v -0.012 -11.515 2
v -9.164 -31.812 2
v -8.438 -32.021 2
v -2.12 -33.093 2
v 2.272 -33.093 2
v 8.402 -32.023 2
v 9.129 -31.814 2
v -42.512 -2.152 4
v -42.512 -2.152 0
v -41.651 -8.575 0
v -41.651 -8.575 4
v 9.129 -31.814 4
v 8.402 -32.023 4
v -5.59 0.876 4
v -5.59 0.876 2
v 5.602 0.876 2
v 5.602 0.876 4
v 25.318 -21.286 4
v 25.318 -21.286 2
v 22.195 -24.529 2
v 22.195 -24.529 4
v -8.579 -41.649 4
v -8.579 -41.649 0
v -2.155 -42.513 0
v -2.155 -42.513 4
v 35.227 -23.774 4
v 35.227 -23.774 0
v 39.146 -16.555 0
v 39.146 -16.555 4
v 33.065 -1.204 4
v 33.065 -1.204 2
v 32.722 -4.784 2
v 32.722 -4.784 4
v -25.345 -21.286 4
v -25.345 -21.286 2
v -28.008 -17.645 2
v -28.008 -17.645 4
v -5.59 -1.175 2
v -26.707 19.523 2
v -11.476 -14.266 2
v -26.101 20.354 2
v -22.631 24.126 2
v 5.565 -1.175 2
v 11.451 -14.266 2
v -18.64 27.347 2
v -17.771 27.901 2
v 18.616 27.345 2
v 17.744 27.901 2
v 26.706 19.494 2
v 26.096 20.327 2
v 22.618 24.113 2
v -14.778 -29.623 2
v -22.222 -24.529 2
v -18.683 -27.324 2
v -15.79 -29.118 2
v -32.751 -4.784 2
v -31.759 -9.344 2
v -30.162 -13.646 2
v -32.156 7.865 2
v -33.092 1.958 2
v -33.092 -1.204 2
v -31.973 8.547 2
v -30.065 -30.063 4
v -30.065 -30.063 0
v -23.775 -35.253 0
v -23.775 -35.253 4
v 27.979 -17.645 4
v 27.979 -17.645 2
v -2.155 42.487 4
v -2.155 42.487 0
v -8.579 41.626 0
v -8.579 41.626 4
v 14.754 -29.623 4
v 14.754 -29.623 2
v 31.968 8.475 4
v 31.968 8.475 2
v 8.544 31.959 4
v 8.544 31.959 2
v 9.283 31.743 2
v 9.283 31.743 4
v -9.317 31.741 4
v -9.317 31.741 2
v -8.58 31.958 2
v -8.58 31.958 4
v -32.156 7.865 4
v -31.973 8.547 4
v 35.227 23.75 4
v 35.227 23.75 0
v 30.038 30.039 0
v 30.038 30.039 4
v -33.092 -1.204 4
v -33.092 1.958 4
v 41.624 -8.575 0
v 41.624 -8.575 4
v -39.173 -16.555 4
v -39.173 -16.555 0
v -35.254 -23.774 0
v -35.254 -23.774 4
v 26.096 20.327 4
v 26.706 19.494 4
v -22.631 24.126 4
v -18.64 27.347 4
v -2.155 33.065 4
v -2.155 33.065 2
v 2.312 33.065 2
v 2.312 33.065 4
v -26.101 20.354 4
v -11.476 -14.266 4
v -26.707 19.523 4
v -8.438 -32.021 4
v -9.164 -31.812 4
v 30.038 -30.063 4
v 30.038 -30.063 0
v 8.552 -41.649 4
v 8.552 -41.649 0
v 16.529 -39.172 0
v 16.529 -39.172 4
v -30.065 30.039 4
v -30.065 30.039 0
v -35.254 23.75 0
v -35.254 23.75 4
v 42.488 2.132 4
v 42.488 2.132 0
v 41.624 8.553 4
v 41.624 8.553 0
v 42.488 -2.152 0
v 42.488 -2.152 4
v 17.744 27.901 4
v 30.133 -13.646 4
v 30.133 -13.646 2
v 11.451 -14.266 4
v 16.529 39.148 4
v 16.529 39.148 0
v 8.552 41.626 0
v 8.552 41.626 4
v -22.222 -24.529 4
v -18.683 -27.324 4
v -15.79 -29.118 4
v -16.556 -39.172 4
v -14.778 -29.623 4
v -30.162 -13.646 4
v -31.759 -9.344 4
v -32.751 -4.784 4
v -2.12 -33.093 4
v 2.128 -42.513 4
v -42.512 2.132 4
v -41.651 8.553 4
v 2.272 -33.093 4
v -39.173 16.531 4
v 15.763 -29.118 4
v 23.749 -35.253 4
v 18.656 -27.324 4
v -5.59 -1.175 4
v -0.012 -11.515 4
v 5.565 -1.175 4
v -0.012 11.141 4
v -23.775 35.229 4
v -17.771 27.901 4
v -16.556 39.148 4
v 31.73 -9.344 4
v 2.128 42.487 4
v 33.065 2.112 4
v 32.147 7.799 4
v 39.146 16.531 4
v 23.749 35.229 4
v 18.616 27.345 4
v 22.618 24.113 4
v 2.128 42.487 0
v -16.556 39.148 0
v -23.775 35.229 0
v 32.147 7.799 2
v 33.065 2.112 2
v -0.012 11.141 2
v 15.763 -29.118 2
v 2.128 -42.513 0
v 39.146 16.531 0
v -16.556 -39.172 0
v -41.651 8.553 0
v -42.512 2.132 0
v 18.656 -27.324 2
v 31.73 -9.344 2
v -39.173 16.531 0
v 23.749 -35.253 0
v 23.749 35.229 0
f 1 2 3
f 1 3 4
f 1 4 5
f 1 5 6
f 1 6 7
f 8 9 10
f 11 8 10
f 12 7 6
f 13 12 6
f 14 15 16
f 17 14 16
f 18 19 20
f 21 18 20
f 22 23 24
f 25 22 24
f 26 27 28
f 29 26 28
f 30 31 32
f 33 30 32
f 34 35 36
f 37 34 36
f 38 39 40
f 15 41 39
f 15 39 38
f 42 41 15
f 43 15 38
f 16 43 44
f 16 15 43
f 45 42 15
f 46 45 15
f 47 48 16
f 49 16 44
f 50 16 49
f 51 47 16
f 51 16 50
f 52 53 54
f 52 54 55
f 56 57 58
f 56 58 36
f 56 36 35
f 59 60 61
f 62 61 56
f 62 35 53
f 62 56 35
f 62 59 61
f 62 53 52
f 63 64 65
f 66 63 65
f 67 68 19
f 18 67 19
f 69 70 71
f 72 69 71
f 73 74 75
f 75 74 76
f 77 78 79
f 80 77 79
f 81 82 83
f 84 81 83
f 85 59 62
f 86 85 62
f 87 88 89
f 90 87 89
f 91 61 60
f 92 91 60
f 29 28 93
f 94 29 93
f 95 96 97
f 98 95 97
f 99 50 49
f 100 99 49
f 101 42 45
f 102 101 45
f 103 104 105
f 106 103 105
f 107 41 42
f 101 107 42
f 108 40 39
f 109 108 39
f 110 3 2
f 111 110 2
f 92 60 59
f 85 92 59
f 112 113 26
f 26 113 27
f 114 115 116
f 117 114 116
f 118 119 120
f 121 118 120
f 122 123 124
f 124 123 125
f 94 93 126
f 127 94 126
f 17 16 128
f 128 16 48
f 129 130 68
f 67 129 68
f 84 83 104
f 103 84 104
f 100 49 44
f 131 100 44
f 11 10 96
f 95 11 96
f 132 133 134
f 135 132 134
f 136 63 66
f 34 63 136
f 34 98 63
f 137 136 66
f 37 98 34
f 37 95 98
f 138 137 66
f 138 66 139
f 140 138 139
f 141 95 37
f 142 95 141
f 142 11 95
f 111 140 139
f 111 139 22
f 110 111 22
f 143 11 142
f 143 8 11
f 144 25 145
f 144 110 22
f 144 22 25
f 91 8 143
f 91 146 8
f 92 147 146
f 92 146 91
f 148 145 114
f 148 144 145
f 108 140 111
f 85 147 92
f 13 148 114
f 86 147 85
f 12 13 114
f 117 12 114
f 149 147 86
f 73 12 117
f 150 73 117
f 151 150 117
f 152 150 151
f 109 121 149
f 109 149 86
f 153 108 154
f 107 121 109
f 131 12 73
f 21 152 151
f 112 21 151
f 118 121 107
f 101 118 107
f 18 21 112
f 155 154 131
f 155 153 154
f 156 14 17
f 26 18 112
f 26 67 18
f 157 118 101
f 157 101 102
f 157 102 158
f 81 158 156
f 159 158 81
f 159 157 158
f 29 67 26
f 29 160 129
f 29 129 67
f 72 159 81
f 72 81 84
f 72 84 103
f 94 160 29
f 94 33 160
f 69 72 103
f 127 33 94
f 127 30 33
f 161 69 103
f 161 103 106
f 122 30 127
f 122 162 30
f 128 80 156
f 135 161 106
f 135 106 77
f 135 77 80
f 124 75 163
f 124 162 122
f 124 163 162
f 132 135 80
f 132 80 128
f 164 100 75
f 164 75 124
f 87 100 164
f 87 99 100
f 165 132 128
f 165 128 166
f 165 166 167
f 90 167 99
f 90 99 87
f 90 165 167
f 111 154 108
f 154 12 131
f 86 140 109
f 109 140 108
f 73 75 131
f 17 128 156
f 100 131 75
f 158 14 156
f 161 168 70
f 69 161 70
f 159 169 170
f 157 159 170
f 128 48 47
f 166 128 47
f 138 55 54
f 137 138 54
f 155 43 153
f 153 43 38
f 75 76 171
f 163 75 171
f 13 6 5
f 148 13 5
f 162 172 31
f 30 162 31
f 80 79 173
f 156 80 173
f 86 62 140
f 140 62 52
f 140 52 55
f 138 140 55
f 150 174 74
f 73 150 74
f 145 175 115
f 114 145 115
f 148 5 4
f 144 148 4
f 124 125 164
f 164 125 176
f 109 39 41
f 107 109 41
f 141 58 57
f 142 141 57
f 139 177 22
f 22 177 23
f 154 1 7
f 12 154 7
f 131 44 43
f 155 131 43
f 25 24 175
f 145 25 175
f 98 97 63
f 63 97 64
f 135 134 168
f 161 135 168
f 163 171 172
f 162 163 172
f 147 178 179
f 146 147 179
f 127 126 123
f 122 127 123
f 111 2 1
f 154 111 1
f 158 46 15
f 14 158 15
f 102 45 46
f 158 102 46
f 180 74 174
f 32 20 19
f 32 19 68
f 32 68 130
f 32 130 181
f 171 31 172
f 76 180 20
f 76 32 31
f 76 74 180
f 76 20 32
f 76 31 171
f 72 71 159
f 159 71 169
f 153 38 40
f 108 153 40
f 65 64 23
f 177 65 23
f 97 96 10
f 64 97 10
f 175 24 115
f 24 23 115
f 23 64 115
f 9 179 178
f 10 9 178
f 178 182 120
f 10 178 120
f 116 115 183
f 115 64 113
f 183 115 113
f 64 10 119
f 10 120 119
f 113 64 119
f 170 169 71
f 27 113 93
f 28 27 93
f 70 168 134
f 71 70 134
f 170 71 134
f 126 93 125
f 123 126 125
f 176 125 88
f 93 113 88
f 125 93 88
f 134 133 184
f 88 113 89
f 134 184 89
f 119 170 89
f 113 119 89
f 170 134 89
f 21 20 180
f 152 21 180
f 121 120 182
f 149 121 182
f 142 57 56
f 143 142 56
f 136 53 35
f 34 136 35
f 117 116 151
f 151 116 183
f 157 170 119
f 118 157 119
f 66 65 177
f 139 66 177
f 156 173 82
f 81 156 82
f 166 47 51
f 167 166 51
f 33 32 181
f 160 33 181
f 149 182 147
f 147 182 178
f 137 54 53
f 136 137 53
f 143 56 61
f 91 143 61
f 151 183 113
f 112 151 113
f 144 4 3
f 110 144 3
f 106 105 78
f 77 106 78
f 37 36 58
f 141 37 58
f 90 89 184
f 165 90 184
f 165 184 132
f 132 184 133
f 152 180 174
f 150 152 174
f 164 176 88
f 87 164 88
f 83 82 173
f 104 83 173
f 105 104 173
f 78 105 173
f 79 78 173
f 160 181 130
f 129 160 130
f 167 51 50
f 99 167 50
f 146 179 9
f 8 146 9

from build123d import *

# Parameters (mm, degrees)
F1_DEPTH = 4
F2_DEPTH = 2


with BuildPart() as f1:
    # F0 (on Top) → F1 (new body)
    with BuildSketch(Plane.XY):
        Polygon((-2.15507, -42.513097), (-0.012324, -42.513097), (2.128266, -42.513097), (8.551832, -41.649458), (16.529186, -39.171592), (23.748692, -35.252986), (30.037865, -30.063322), (35.227457, -23.774077), (39.146422, -16.554931), (41.624073, -8.575349), (42.487568, -2.151782), (42.487568, -0.011192), (42.487568, 2.131554), (41.624073, 8.553324), (39.146422, 16.530678), (35.227457, 23.749824), (30.037865, 30.039356), (23.748692, 35.228948), (16.529186, 39.147554), (8.551832, 41.625565), (2.128266, 42.486903), (-0.012324, 42.486903), (-2.15507, 42.486903), (-8.578637, 41.625565), (-16.556206, 39.147554), (-23.775352, 35.228948), (-30.064598, 30.039356), (-35.254262, 23.749824), (-39.172867, 16.530678), (-41.650734, 8.553324), (-42.512432, 2.131554), (-42.512432, -0.011192), (-42.512432, -2.151782), (-41.650734, -8.575349), (-39.172867, -16.554931), (-35.254262, -23.774077), (-30.064598, -30.063322), (-23.775352, -35.252986), (-16.556206, -39.171592), (-8.578637, -41.649458), align=None)
        Polygon((-32.156461, 7.865187), (-31.973198, 8.547215), (-14.778227, -29.622735), (-15.790021, -29.11779), (-18.683142, -27.324179), (-22.221601, -24.528584), (-25.344771, -21.286472), (-28.007842, -17.644702), (-30.162087, -13.646215), (-31.758743, -9.343618), (-32.751061, -4.78359), (-33.092255, -1.204202), (-33.092255, -0.011192), (-33.092255, 1.957992), align=None, mode=Mode.SUBTRACT)
        Polygon((-8.438135, -32.020684), (-9.163643, -31.812051), (-0.012324, -11.515471), (9.128933, -31.813992), (8.401628, -32.022625), (2.272361, -33.09292), (-0.012324, -33.09292), (-2.119855, -33.09292), align=None, mode=Mode.SUBTRACT)
        Polygon((15.763073, -29.11779), (14.753686, -29.622735), (31.967882, 8.475347), (32.147192, 7.798709), (33.065307, 2.112149), (33.065307, -0.011192), (33.065307, -1.204202), (32.722496, -4.78359), (31.730358, -9.343618), (30.13345, -13.646215), (27.979205, -17.644702), (25.31829, -21.286472), (22.194904, -24.528584), (18.656481, -27.324179), align=None, mode=Mode.SUBTRACT)
        Polygon((-0.012324, 11.140574), (-9.317441, 31.741192), (-8.580434, 31.957874), (-2.15507, 33.064642), (-0.012324, 33.064642), (2.311529, 33.064642), (8.543927, 31.959311), (9.28309, 31.743348), align=None, mode=Mode.SUBTRACT)
        Polygon((5.602367, 0.876019), (17.744116, 27.900922), (18.615516, 27.344664), (22.618207, 24.112757), (26.095902, 20.326748), (26.706062, 19.494157), (11.45099, -14.266185), (5.565355, -1.175095), (-5.590004, -1.175095), (-11.475638, -14.266185), (-26.707461, 19.523263), (-26.101182, 20.354058), (-22.630997, 24.126053), (-18.640272, 27.34682), (-17.770777, 27.900922), (-5.590004, 0.876019), align=None, mode=Mode.SUBTRACT)
    extrude(amount=F1_DEPTH)

    # F0 (on Top) → F2 (join)
    with BuildSketch(Plane.XY):
        Polygon((18.615516, 27.344664), (17.744116, 27.900922), (5.602367, 0.876019), (-5.590004, 0.876019), (-17.770777, 27.900922), (-18.640272, 27.34682), (-22.630997, 24.126053), (-26.101182, 20.354058), (-26.707461, 19.523263), (-11.475638, -14.266185), (-5.590004, -1.175095), (5.565355, -1.175095), (11.45099, -14.266185), (26.706062, 19.494157), (26.095902, 20.326748), (22.618207, 24.112757), align=None)
        Polygon((-14.778227, -29.622735), (-31.973198, 8.547215), (-32.156461, 7.865187), (-33.092255, 1.957992), (-33.092255, -0.011192), (-33.092255, -1.204202), (-32.751061, -4.78359), (-31.758743, -9.343618), (-30.162087, -13.646215), (-28.007842, -17.644702), (-25.344771, -21.286472), (-22.221601, -24.528584), (-18.683142, -27.324179), (-15.790021, -29.11779), align=None)
        Polygon((-0.012324, -11.515471), (-9.163643, -31.812051), (-8.438135, -32.020684), (-2.119855, -33.09292), (-0.012324, -33.09292), (2.272361, -33.09292), (8.401628, -32.022625), (9.128933, -31.813992), align=None)
        Polygon((31.967882, 8.475347), (14.753686, -29.622735), (15.763073, -29.11779), (18.656481, -27.324179), (22.194904, -24.528584), (25.31829, -21.286472), (27.979205, -17.644702), (30.13345, -13.646215), (31.730358, -9.343618), (32.722496, -4.78359), (33.065307, -1.204202), (33.065307, -0.011192), (33.065307, 2.112149), (32.147192, 7.798709), align=None)
        Polygon((-8.580434, 31.957874), (-9.317441, 31.741192), (-0.012324, 11.140574), (9.28309, 31.743348), (8.543927, 31.959311), (2.311529, 33.064642), (-0.012324, 33.064642), (-2.15507, 33.064642), align=None)
    extrude(amount=F2_DEPTH)


solid = f1.part
